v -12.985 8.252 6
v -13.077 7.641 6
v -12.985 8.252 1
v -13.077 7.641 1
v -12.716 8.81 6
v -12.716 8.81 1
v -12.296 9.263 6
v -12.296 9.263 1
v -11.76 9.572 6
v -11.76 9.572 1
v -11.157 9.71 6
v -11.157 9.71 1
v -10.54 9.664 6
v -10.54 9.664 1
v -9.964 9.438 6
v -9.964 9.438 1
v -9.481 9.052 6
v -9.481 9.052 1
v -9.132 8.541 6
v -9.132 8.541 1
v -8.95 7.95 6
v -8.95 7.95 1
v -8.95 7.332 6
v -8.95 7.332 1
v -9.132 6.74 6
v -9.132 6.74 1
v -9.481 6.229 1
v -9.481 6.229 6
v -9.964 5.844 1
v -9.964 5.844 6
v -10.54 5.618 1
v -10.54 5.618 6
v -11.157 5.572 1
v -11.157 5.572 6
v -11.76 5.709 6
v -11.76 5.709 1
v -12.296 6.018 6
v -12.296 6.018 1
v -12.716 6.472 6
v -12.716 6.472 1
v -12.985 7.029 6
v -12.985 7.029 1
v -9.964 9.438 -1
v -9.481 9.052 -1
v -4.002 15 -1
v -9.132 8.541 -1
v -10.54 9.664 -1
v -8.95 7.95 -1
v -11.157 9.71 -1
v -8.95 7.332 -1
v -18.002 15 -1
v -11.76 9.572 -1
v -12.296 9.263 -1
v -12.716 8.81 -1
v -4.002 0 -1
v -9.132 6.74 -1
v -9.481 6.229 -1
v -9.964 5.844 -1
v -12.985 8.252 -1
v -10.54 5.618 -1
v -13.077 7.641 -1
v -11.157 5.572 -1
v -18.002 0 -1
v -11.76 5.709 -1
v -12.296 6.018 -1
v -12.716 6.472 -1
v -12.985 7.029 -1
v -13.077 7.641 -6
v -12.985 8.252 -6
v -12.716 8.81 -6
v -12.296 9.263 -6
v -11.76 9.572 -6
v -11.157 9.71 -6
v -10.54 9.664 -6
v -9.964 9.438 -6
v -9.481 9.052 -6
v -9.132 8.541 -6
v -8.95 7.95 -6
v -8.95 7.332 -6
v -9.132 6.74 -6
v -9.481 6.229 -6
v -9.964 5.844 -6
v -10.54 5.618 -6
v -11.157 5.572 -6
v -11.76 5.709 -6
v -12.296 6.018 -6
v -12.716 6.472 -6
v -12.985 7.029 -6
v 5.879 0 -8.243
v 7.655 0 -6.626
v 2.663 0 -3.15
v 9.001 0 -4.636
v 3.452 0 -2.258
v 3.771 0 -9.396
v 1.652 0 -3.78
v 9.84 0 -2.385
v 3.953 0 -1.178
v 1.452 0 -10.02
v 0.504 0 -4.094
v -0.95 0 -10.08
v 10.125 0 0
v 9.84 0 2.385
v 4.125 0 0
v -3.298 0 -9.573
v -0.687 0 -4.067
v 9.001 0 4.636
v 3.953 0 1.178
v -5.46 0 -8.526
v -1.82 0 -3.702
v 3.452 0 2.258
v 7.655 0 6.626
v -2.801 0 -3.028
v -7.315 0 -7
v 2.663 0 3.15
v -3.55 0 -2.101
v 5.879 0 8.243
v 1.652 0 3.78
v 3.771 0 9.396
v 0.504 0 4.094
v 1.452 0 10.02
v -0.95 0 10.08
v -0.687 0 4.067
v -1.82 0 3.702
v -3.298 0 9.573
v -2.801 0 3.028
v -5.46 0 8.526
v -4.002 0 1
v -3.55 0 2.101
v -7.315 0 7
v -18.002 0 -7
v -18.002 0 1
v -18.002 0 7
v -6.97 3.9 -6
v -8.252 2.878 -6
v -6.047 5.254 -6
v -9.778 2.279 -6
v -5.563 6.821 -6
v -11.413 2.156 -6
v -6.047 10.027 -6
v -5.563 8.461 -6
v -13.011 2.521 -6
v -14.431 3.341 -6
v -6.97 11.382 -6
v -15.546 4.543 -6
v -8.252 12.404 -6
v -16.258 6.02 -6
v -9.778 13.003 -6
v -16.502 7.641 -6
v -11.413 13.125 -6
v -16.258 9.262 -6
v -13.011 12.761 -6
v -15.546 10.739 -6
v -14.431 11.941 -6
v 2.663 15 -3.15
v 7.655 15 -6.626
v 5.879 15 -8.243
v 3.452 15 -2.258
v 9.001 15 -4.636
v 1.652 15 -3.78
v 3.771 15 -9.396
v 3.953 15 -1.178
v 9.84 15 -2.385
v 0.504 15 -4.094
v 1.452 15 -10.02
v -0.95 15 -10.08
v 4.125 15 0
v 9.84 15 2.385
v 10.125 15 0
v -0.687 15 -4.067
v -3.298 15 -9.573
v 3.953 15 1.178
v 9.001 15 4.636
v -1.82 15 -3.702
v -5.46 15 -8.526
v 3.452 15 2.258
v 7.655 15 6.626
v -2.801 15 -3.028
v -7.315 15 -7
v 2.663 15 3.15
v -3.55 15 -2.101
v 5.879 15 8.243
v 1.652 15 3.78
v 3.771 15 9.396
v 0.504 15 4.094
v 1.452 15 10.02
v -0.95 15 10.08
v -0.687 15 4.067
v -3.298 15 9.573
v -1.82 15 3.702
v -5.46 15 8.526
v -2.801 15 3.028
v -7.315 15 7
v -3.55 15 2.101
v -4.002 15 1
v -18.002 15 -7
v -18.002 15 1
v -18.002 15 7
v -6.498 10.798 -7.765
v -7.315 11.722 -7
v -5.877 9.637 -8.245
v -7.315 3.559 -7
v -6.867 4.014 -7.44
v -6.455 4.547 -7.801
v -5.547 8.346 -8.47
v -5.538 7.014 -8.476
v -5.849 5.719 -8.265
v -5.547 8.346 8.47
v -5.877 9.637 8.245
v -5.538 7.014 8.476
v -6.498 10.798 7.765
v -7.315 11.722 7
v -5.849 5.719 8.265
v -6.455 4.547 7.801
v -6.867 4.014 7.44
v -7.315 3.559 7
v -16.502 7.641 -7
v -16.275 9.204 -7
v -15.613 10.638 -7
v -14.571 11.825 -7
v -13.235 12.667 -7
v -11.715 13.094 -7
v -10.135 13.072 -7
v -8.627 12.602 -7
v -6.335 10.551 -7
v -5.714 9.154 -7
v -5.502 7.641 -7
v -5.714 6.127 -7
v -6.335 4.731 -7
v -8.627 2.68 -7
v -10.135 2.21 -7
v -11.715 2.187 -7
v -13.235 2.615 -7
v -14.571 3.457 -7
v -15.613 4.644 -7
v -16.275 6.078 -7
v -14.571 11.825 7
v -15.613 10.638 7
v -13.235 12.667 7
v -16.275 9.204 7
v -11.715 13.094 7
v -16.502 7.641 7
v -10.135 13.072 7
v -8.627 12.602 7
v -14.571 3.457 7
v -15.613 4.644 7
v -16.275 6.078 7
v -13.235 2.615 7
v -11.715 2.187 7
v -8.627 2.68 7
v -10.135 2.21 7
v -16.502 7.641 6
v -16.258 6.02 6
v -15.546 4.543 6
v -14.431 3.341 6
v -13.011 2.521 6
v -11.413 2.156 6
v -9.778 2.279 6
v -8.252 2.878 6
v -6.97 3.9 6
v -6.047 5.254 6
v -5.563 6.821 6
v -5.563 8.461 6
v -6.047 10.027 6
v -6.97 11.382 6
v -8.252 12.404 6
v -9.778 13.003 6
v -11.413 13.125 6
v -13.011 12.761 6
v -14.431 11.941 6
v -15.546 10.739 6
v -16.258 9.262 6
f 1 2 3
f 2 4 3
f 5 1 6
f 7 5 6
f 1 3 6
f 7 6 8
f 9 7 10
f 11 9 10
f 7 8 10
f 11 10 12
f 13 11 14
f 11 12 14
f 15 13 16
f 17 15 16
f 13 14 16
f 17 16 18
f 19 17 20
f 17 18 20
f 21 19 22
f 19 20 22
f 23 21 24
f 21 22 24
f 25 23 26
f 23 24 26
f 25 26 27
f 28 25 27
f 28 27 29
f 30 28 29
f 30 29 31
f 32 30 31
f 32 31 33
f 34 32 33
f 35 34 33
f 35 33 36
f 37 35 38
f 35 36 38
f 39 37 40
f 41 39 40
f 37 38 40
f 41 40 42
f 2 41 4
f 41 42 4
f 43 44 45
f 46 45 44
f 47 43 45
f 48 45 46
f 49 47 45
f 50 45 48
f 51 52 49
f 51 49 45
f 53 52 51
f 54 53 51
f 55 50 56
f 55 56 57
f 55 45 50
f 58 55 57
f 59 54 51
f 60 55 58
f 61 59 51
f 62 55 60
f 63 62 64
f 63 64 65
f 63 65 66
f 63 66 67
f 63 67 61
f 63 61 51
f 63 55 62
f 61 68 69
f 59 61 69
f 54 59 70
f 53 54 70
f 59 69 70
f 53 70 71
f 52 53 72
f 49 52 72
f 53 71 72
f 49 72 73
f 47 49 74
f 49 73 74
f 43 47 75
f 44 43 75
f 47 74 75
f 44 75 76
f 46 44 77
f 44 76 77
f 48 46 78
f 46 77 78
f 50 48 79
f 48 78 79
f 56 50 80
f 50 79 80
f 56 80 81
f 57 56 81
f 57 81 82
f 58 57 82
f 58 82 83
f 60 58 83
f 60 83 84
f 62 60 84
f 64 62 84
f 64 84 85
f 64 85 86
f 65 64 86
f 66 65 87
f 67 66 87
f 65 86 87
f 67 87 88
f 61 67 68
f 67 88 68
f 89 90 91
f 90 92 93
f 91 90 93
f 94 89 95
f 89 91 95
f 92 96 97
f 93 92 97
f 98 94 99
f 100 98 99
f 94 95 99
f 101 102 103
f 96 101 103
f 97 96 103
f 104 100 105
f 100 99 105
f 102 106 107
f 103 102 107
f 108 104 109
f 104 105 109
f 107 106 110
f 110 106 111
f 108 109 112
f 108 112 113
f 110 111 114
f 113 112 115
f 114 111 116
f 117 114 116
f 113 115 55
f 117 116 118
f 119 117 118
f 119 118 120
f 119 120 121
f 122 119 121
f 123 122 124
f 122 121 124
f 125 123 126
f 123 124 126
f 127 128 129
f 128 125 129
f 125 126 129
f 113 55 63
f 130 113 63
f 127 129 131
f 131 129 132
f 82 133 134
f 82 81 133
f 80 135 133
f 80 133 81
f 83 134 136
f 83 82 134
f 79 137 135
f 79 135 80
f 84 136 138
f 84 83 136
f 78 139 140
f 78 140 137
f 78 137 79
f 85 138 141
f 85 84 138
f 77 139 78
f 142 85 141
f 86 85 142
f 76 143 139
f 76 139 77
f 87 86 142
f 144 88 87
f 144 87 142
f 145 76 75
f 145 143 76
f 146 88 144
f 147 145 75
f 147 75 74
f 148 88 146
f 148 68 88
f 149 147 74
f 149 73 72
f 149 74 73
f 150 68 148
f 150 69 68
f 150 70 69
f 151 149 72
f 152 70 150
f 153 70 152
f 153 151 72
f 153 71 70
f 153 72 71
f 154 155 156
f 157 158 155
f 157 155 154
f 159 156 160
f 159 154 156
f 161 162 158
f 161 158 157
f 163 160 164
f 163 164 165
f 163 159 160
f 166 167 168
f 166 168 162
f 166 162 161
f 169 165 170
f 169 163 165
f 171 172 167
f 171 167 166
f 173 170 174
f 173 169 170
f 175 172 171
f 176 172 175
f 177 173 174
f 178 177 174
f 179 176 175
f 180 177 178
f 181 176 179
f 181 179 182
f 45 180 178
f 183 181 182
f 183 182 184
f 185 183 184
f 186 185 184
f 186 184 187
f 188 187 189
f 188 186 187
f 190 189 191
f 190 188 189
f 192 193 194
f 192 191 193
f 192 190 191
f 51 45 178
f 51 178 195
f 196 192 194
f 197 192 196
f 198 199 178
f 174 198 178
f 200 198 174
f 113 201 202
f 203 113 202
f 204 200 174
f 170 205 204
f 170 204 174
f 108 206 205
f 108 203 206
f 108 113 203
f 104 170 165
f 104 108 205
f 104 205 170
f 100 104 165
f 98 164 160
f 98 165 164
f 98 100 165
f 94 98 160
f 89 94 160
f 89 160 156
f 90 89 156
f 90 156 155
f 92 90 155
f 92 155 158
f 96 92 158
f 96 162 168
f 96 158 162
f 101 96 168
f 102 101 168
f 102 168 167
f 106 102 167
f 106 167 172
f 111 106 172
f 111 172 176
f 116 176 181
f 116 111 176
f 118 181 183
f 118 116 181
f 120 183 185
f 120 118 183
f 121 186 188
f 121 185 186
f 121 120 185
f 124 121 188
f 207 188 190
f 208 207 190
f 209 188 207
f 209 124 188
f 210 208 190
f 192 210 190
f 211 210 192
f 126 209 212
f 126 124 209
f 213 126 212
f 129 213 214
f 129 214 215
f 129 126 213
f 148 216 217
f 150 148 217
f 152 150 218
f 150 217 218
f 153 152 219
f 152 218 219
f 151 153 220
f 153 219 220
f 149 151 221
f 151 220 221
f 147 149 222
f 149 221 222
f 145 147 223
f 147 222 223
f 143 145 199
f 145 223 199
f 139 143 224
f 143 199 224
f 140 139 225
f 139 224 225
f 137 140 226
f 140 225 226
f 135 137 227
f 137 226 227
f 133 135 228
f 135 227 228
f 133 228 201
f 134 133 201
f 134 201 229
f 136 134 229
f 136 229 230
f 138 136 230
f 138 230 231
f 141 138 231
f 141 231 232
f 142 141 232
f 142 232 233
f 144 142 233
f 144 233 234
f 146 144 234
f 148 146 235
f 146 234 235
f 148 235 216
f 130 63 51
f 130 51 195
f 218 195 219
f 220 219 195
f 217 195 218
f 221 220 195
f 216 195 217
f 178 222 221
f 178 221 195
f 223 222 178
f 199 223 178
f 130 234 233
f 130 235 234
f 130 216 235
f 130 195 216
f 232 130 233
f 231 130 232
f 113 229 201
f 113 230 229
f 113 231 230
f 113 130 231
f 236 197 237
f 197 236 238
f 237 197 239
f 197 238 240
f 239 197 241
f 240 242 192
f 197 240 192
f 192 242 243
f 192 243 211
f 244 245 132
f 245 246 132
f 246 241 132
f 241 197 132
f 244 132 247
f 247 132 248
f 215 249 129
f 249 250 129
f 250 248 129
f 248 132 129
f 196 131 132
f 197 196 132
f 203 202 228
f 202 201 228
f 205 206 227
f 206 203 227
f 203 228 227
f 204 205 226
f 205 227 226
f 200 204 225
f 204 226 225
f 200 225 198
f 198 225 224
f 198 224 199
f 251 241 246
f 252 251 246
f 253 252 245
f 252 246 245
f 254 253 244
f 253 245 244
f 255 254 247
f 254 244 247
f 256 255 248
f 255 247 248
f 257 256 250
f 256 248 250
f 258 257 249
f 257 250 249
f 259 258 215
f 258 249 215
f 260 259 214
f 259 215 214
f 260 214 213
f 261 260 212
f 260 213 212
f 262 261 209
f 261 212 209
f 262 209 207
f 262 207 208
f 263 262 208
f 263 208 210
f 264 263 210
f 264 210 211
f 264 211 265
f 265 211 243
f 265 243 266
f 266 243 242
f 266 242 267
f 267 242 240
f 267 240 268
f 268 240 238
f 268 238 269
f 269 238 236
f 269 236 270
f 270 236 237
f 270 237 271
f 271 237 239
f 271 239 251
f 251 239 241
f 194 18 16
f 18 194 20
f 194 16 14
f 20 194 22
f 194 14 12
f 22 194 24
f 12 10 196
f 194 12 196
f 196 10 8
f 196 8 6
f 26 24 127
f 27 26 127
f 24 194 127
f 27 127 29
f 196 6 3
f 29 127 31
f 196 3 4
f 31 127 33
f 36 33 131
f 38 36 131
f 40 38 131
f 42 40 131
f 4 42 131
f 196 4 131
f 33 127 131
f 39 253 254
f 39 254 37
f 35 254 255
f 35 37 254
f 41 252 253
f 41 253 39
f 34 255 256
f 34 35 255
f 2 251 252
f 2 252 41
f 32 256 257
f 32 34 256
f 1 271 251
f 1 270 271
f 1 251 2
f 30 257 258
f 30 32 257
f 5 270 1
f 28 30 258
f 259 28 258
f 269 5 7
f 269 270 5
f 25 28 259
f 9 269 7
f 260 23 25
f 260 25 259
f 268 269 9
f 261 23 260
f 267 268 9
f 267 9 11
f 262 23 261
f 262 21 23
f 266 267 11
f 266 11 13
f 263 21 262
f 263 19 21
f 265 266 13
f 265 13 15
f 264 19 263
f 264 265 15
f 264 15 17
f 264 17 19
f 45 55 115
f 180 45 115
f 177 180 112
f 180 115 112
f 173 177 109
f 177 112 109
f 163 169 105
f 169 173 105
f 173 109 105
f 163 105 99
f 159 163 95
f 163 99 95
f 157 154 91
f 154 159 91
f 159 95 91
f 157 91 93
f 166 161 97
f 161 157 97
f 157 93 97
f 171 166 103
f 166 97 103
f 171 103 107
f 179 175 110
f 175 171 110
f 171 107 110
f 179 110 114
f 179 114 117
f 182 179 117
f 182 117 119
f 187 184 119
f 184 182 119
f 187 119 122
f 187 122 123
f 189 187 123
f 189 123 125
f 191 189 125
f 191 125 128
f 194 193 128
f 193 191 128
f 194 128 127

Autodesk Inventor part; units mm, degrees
ref_plane "YZ Plane" through (0, 0, 0) normal (1, 0, 0) x (0, 1, 0)
ref_plane "XZ Plane" through (0, 0, 0) normal (0, 1, 0) x (-1, 0, 0)
sketch "Sketch1" plane through (0, 0, 0) normal (0, 1, 0) x (-1, 0, 0)
  circle A0 centre (0, 0) radius 4.125
  circle A1 centre (0, 0) radius 10.125
  line L0 (4.002, 1) -> (18.002, 1)
  line L1 (18.002, 1) -> (18.002, 7)
  line L2 (18.002, 7) -> (4.002, 7)
  line L3 (4.002, 7) -> (4.002, 1)
  line L4 (-15, 0) -> (15, 0) construction
  line L5 (-15, 0) -> (15, 0) construction
  line L6 (4.002, -1) -> (18.002, -1)
  line L7 (18.002, -1) -> (18.002, -7)
  line L8 (18.002, -7) -> (4.002, -7)
  line L9 (4.002, -7) -> (4.002, -1)
  point P0 (7.3154, 7)
  point P1 (7.3154, -7)
  point P2 (10.0755, -1)
  point P3 (4.0946, -5.2082)
  point P4 (4.002, -1)
  point P5 (4.0946, 5.2082)
  point P6 (10.0755, 1)
  dimension "eje" = 8.25
  dimension "diam_externo" = 20.25
  dimension "sep" = 1
  dimension "guia_central" = 30
  dimension "d4" = 0
  dimension "lengueta_espesor" = 6
  dimension "lengueta_alto" = 14
extrude "abrazadera" add sketch "Sketch1" along normal blind 15 contours L3 L2 A1 L0 | A0 L9 L8 A1 L2 L3 | L6 A1 L8 L9 | A1 L2 L1 L0 | L6 L7 L8 A1
sketch "Sketch5" plane through (-7.3154, 0, -7) normal (0, 0, -1) x (-1, 0, 0)
  circle A0 centre (3.6865, 7.6408) radius 2.075
  line L0 (-3.3135, 0) -> (-3.3135, 15) projected
  point P0 (-7.3154, 0)
  dimension "hueco_tornillo" = 4.15
  dimension "hueco_tornillo_distancia" = 7
extrude "tornillo" cut sketch "Sketch5" against normal blind 14
sketch "Sketch6" plane through (-7.3154, 0, -7) normal (0, 0, -1) x (-1, 0, 0)
  circle A0 centre (3.6865, 7.6408) radius 2.075 projected
  circle A1 centre (3.6865, 7.6408) radius 5.5
  point P0 (-7.3154, 0)
  dimension "arandela" = 11
extrude "arandela" cut sketch "Sketch6" along normal blind 5 and the other way blind 1
ref_plane "Work Plane1" through (-7.3154, 0, 0) normal (0, 0, -1) x (-1, 0, 0)
mirror "Mirror1" about plane through (-7.3154, 0, 0) normal (0, 0, -1) of "arandela"
equation "\"diam_externo\" = eje + 2 * espesor"
equation "\"lengueta_espesor\" = espesor"
equation "\"hueco_tornillo_agujero\" = 2 * sep + 2 * lengueta_espesor"
equation "\"espesor\" = 6"
properties part number "Abrazadera"
